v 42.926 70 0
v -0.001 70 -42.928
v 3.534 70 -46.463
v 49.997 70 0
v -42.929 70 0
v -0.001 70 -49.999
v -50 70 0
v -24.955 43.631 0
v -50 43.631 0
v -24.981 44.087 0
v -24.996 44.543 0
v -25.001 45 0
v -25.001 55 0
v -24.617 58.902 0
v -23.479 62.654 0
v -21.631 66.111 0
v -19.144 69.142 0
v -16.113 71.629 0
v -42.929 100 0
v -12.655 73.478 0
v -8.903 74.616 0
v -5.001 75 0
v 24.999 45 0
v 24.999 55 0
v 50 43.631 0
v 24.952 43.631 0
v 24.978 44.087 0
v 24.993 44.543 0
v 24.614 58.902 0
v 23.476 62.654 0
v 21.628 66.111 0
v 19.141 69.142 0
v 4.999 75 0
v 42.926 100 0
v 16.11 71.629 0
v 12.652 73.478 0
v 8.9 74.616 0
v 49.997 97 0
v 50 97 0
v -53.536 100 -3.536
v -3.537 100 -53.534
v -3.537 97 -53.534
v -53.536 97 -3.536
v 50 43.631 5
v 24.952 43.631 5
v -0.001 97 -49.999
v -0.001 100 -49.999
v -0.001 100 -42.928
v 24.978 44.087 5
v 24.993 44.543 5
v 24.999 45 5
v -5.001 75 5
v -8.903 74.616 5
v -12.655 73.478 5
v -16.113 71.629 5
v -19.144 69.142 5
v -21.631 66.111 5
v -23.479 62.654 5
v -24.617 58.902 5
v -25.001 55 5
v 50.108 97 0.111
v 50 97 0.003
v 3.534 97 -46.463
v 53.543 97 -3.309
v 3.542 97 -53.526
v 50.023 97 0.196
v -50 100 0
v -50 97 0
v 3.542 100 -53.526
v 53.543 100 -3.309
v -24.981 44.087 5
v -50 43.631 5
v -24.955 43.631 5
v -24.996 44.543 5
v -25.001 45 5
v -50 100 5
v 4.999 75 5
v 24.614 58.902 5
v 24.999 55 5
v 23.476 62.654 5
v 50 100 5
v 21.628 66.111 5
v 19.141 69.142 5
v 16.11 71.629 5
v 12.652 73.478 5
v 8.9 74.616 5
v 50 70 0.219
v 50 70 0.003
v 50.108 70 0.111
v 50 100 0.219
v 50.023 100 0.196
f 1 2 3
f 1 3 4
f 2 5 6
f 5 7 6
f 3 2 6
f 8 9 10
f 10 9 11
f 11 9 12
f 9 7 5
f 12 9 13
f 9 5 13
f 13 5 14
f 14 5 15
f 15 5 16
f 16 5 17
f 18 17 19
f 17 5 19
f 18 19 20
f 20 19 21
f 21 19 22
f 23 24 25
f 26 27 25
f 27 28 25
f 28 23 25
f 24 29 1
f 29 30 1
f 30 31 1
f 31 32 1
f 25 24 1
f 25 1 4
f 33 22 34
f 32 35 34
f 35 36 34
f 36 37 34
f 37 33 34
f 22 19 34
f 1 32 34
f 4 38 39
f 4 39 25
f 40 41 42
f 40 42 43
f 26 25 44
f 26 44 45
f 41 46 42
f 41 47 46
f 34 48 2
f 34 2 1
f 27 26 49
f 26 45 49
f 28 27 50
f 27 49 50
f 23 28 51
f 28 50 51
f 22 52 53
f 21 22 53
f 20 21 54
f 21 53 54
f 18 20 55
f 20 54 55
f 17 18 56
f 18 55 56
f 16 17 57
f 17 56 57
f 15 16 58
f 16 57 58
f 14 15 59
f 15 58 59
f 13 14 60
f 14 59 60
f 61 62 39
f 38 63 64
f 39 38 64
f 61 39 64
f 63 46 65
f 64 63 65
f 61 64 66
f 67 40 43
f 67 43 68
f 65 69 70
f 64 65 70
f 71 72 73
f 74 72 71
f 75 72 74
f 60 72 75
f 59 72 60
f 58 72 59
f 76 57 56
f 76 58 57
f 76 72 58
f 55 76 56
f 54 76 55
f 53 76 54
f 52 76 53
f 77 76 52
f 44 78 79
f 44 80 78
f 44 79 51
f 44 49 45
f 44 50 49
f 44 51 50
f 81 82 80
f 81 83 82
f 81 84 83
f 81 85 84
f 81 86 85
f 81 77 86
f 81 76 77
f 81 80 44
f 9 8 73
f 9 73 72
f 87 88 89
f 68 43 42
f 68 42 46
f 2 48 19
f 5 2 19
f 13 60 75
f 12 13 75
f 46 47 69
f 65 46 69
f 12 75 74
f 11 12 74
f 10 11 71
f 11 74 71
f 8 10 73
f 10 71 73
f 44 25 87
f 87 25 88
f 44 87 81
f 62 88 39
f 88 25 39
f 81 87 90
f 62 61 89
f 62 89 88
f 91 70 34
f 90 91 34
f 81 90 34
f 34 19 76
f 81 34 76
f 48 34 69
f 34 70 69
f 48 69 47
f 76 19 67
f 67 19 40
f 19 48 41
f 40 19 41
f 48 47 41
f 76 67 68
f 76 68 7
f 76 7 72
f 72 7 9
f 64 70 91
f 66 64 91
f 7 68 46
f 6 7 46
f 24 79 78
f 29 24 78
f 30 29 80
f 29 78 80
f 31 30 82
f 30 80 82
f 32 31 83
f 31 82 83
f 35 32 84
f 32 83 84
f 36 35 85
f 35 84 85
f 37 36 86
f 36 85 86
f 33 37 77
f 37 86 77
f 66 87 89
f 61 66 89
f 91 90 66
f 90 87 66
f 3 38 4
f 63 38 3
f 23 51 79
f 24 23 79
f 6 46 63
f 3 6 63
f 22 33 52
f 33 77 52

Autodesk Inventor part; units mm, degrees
ref_plane "YZ Plane" through (0, 0, 0) normal (1, 0, 0) x (0, 1, 0)
ref_plane "XZ Plane" through (0, 0, 0) normal (0, 1, 0) x (-1, 0, 0)
ref_plane "XY Plane" through (0, 0, 0) normal (0, 0, 1) x (1, 0, 0)
sketch "Sketch1" plane through (0, 0, 0) normal (0, 0, 1) x (1, 0, 0)
  line L0 (-50, -100) -> (50, -100)
  line L1 (50, -100) -> (50, 100)
  line L2 (50, 100) -> (-50, 100)
  line L3 (-50, 100) -> (-50, -100)
  line L4 (-50, -100) -> (50, 100) construction
  line L5 (50, -100) -> (-50, 100) construction
  point P0 (0, 0)
  dimension "d0" = 100
  dimension "d1" = 200
extrude "Extrusion1" add sketch "Sketch1" along normal blind 5
sketch "Sketch2" plane through (-50, 100, 0) normal (0, 1, 0) x (1, 0, 0)
  line L0 (0, 0) -> (100, 0) projected
  line L1 (0, 0) -> (49.9986, 49.9986)
  line L2 (49.9986, 49.9986) -> (53.5341, 46.463)
  line L3 (53.5341, 46.463) -> (3.5355, -3.5355)
  line L4 (3.5355, -3.5355) -> (0, 0)
  line L5 (0, 0) -> (70.7086, 0) construction
  line L6 (100.108, -0.1109) -> (53.5341, 46.463)
  line L7 (53.5341, 46.463) -> (49.9986, 42.9275)
  line L8 (49.9986, 42.9275) -> (96.5724, -3.6464)
  line L9 (96.5724, -3.6464) -> (100.108, -0.1109)
  point P0 (50, 0)
  point P1 (49.9986, 42.9275)
  dimension "d4" = 45
  dimension "d5" = 5
  dimension "d6" = 5
extrude "Extrusion2" add sketch "Sketch2" against normal blind 30 contours L1 L2 L3 L0 | L0 L3 L4 | L8 L3 L6 L0 | L0 L6 L9 L8
sketch "Sketch6" plane through (0, 0, 5) normal (0, 0, 1) x (1, 0, 0)
  line L0 (4.9986, 75) -> (-5.0014, 75)
  line L1 (-25.0014, 55) -> (-25.0014, 45)
  line L2 (-5.0014, 25) -> (4.9986, 25)
  line L3 (24.9986, 45) -> (24.9986, 55)
  line L4 (24.9986, 75) -> (-25.0014, 25) construction
  line L5 (-25.0014, 75) -> (24.9986, 25) construction
  arc A0 (4.9986, 25) -> (24.9986, 45) centre (4.9986, 45) ccw
  arc A1 (24.9986, 55) -> (4.9986, 75) centre (4.9986, 55) ccw
  arc A2 (-5.0014, 75) -> (-25.0014, 55) centre (-5.0014, 55) ccw
  arc A3 (-25.0014, 45) -> (-5.0014, 25) centre (-5.0014, 45) ccw
  point P0 (0, 0)
  point P1 (-0.0014, 50)
  dimension "d21" = 50
  dimension "d22" = 50
  dimension "d23" = 20
extrude "Extrusion6" cut sketch "Sketch6" against normal blind 5
sketch "Sketch10" plane through (-50, 100, 5) normal (0, 1, 0) x (1, 0, 0)
  line L0 (0, 5) -> (7.0711, 5) projected
  line L1 (49.9986, 54.9986) -> (99.9971, 5) projected
  line L2 (0, 5) -> (49.9986, 54.9986)
  line L3 (49.9986, 54.9986) -> (46.463, 58.5341)
  line L4 (46.463, 58.5341) -> (-3.5355, 8.5355)
  line L5 (-3.5355, 8.5355) -> (0, 5)
  line L6 (100, 4.7812) -> (100, 0) projected
  line L7 (100, 4.7812) -> (49.9986, 54.9986)
  line L8 (49.9986, 54.9986) -> (53.5417, 58.5265)
  line L9 (53.5417, 58.5265) -> (103.5431, 8.3091)
  line L10 (103.5431, 8.3091) -> (100, 4.7812)
  line L11 (92.926, 5) -> (49.9986, 47.9275) projected
  line L12 (100, 0) -> (0, 0) projected
  line L13 (0, 0) -> (100, 0)
  point P0 (50, 5)
  dimension "d33" = 5
  dimension "d34" = 5
extrude "Extrusion9" add sketch "Sketch10" against normal blind 3
sketch "Sketch12" plane through (0, 0, 0) normal (0, 0, -1) x (-1, 0, 0)
  point P0 (0, 0)
sketch "Sketch13" plane through (0, 0, 0) normal (0, 0, -1) x (-1, 0, 0)
  line L0 (50, 100) -> (50, -100) projected
  line L1 (-50, -100) -> (-50, 97) projected
  line L2 (50, -100) -> (-50, -100)
  line L3 (-50, -100) -> (-50, 43.6313)
  line L4 (-50, 43.6313) -> (50, 43.6313)
  line L5 (50, 43.6313) -> (50, -100)
  point P0 (0, 0)
extrude "Extrusion10" cut sketch "Sketch13" against normal through all
properties part number "fixation_v08_ephys"
